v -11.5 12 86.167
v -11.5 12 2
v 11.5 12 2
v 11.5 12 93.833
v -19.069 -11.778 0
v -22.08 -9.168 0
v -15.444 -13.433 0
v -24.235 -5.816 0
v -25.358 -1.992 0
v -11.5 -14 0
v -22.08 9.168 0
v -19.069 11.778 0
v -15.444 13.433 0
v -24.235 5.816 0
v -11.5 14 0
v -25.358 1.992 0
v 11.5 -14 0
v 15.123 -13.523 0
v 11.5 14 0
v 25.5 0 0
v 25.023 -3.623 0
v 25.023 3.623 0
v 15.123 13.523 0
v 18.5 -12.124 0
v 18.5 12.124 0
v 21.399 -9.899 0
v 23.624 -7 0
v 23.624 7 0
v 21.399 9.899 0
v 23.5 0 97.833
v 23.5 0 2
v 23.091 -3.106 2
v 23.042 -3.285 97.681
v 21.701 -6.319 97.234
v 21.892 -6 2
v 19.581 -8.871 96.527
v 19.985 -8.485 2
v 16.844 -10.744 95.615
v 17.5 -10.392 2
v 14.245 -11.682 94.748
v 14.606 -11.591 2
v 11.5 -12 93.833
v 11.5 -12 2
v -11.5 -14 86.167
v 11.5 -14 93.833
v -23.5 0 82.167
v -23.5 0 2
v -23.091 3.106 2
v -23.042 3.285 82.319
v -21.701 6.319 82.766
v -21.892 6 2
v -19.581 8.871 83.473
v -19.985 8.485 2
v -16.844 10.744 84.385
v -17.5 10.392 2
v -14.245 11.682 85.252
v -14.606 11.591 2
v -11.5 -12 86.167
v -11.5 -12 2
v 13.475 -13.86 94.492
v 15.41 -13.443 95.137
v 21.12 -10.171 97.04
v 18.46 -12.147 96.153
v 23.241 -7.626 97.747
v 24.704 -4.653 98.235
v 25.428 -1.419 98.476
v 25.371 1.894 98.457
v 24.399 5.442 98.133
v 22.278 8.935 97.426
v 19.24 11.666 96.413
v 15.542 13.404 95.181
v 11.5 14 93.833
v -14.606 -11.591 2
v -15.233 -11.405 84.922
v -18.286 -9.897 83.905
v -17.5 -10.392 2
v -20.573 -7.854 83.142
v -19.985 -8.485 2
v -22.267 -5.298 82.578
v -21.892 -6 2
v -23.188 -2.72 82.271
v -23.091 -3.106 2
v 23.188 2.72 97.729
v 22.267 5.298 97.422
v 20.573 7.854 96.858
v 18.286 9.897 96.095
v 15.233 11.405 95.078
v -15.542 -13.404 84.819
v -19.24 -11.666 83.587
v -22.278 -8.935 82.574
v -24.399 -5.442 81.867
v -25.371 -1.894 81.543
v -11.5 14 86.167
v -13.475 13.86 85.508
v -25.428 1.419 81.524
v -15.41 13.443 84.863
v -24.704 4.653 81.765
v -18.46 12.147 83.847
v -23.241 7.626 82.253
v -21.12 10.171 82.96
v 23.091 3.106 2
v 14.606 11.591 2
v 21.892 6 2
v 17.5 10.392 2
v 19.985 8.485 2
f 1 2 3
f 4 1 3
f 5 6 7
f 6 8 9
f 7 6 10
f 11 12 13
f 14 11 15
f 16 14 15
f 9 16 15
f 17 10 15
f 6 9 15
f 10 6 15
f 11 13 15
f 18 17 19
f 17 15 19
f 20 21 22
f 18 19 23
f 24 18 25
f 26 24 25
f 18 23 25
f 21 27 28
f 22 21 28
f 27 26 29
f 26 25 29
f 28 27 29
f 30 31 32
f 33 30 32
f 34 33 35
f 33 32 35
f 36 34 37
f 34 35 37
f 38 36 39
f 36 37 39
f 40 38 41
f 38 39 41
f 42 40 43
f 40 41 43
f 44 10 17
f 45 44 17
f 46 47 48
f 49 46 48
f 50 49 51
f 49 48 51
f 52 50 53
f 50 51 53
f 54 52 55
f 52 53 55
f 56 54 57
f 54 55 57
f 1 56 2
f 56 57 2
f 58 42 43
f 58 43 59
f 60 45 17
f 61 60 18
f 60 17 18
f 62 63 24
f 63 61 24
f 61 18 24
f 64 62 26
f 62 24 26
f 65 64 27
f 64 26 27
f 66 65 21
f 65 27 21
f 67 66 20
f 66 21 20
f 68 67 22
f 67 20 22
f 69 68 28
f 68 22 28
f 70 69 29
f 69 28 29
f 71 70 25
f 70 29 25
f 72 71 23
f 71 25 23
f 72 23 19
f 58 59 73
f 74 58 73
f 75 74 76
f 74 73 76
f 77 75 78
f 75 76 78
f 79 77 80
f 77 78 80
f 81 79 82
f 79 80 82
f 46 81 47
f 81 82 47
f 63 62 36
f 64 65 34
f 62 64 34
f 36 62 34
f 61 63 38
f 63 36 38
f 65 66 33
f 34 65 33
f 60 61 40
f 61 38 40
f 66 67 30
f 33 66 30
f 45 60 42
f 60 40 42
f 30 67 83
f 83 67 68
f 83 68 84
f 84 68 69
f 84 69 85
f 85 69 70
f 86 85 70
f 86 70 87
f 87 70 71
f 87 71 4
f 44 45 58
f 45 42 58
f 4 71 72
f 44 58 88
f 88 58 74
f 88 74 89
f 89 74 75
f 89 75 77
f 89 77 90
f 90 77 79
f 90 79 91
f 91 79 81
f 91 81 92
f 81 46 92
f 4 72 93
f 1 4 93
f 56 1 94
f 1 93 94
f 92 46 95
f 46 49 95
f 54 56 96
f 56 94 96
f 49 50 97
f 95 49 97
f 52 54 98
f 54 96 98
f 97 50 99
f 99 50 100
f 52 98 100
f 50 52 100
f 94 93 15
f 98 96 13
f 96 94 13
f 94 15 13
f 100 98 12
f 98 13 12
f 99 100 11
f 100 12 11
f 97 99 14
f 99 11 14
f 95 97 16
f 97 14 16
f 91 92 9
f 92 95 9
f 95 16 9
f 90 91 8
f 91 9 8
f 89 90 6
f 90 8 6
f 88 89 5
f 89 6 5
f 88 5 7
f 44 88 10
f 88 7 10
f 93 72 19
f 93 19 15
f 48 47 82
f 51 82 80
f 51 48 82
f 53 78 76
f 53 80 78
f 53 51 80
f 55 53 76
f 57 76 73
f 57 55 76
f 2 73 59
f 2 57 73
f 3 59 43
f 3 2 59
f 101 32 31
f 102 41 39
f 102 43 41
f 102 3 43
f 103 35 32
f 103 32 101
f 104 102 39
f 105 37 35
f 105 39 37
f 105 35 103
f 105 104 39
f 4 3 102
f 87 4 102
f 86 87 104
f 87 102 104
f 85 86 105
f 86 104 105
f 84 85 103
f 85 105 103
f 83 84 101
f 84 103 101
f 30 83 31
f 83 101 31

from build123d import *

# Parameters (mm, degrees)
F1_DEPTH = 2
F2_DEPTH = 100
F4_DEPTH = 28.001


with BuildPart() as f1:
    # F0 (on Top) → F1 (new body)
    with BuildSketch(Plane.XY):
        with BuildLine():
            ThreePointArc((23.5, 0), (19.9852813742, 8.4852813742), (11.5, 12))
            Line((11.5, 12), (-4.2888974491, 12))
            ThreePointArc((-4.2888974491, 12), (0.6851433252, 6.8936407031), (2.5, 0))
            ThreePointArc((2.5, 0), (0.6851433252, -6.8936407031), (-4.2888974491, -12))
            Line((-4.2888974491, -12), (11.5, -12))
            ThreePointArc((11.5, -12), (19.9852813742, -8.4852813742), (23.5, 0))
        make_face()
        with BuildLine():
            ThreePointArc((2.5, 0), (0.6851433252, 6.8936407031), (-4.2888974491, 12))
            Line((-4.2888974491, 12), (-11.5, 12))
            ThreePointArc((-11.5, 12), (-19.9852813742, 8.4852813742), (-23.5, 0))
            ThreePointArc((-23.5, 0), (-19.9852813742, -8.4852813742), (-11.5, -12))
            Line((-11.5, -12), (-4.2888974491, -12))
            ThreePointArc((-4.2888974491, -12), (0.6851433252, -6.8936407031), (2.5, 0))
        make_face()
        with BuildLine():
            Line((-4.2888974491, 12), (11.5, 12))
            ThreePointArc((11.5, 12), (19.9852813742, 8.4852813742), (23.5, 0))
            ThreePointArc((23.5, 0), (19.9852813742, -8.4852813742), (11.5, -12))
            Line((11.5, -12), (-4.2888974491, -12))
            ThreePointArc((-4.2888974491, -12), (-7.7583426132, -13.4907375632), (-11.5, -14))
            Line((-11.5, -14), (11.5, -14))
            ThreePointArc((11.5, -14), (21.3994949366, -9.8994949366), (25.5, 0))
            ThreePointArc((25.5, 0), (21.3994949366, 9.8994949366), (11.5, 14))
            Line((11.5, 14), (-11.5, 14))
            ThreePointArc((-11.5, 14), (-7.7583426132, 13.4907375632), (-4.2888974491, 12))
        make_face()
        with BuildLine():
            Line((-11.5, 12), (-4.2888974491, 12))
            ThreePointArc((-4.2888974491, 12), (-7.7583426132, 13.4907375632), (-11.5, 14))
            ThreePointArc((-11.5, 14), (-25.5, 0), (-11.5, -14))
            ThreePointArc((-11.5, -14), (-7.7583426132, -13.4907375632), (-4.2888974491, -12))
            Line((-4.2888974491, -12), (-11.5, -12))
            ThreePointArc((-11.5, -12), (-19.9852813742, -8.4852813742), (-23.5, 0))
            ThreePointArc((-23.5, 0), (-19.9852813742, 8.4852813742), (-11.5, 12))
        make_face()
    extrude(amount=F1_DEPTH)

    # F0 (on Top) → F2 (join)
    with BuildSketch(Plane.XY):
        with BuildLine():
            Line((-4.2888974491, 12), (11.5, 12))
            ThreePointArc((11.5, 12), (19.9852813742, 8.4852813742), (23.5, 0))
            ThreePointArc((23.5, 0), (19.9852813742, -8.4852813742), (11.5, -12))
            Line((11.5, -12), (-4.2888974491, -12))
            ThreePointArc((-4.2888974491, -12), (-7.7583426132, -13.4907375632), (-11.5, -14))
            Line((-11.5, -14), (11.5, -14))
            ThreePointArc((11.5, -14), (21.3994949366, -9.8994949366), (25.5, 0))
            ThreePointArc((25.5, 0), (21.3994949366, 9.8994949366), (11.5, 14))
            Line((11.5, 14), (-11.5, 14))
            ThreePointArc((-11.5, 14), (-7.7583426132, 13.4907375632), (-4.2888974491, 12))
        make_face()
        with BuildLine():
            Line((-11.5, 12), (-4.2888974491, 12))
            ThreePointArc((-4.2888974491, 12), (-7.7583426132, 13.4907375632), (-11.5, 14))
            ThreePointArc((-11.5, 14), (-25.5, 0), (-11.5, -14))
            ThreePointArc((-11.5, -14), (-7.7583426132, -13.4907375632), (-4.2888974491, -12))
            Line((-4.2888974491, -12), (-11.5, -12))
            ThreePointArc((-11.5, -12), (-19.9852813742, -8.4852813742), (-23.5, 0))
            ThreePointArc((-23.5, 0), (-19.9852813742, 8.4852813742), (-11.5, 12))
        make_face()
    extrude(amount=F2_DEPTH)

    # F3 (on face) → F4 (cut, through all)
    with BuildSketch(Plane(origin=(0, 14, 0), x_dir=(-1, 0, 0), z_dir=(0, 1, 0))):
        Polygon((-30, 127.5684932653), (-30, 100), (30, 80), (30, 127.5684932653), align=None)
    extrude(amount=-F4_DEPTH, mode=Mode.SUBTRACT)


solid = f1.part
